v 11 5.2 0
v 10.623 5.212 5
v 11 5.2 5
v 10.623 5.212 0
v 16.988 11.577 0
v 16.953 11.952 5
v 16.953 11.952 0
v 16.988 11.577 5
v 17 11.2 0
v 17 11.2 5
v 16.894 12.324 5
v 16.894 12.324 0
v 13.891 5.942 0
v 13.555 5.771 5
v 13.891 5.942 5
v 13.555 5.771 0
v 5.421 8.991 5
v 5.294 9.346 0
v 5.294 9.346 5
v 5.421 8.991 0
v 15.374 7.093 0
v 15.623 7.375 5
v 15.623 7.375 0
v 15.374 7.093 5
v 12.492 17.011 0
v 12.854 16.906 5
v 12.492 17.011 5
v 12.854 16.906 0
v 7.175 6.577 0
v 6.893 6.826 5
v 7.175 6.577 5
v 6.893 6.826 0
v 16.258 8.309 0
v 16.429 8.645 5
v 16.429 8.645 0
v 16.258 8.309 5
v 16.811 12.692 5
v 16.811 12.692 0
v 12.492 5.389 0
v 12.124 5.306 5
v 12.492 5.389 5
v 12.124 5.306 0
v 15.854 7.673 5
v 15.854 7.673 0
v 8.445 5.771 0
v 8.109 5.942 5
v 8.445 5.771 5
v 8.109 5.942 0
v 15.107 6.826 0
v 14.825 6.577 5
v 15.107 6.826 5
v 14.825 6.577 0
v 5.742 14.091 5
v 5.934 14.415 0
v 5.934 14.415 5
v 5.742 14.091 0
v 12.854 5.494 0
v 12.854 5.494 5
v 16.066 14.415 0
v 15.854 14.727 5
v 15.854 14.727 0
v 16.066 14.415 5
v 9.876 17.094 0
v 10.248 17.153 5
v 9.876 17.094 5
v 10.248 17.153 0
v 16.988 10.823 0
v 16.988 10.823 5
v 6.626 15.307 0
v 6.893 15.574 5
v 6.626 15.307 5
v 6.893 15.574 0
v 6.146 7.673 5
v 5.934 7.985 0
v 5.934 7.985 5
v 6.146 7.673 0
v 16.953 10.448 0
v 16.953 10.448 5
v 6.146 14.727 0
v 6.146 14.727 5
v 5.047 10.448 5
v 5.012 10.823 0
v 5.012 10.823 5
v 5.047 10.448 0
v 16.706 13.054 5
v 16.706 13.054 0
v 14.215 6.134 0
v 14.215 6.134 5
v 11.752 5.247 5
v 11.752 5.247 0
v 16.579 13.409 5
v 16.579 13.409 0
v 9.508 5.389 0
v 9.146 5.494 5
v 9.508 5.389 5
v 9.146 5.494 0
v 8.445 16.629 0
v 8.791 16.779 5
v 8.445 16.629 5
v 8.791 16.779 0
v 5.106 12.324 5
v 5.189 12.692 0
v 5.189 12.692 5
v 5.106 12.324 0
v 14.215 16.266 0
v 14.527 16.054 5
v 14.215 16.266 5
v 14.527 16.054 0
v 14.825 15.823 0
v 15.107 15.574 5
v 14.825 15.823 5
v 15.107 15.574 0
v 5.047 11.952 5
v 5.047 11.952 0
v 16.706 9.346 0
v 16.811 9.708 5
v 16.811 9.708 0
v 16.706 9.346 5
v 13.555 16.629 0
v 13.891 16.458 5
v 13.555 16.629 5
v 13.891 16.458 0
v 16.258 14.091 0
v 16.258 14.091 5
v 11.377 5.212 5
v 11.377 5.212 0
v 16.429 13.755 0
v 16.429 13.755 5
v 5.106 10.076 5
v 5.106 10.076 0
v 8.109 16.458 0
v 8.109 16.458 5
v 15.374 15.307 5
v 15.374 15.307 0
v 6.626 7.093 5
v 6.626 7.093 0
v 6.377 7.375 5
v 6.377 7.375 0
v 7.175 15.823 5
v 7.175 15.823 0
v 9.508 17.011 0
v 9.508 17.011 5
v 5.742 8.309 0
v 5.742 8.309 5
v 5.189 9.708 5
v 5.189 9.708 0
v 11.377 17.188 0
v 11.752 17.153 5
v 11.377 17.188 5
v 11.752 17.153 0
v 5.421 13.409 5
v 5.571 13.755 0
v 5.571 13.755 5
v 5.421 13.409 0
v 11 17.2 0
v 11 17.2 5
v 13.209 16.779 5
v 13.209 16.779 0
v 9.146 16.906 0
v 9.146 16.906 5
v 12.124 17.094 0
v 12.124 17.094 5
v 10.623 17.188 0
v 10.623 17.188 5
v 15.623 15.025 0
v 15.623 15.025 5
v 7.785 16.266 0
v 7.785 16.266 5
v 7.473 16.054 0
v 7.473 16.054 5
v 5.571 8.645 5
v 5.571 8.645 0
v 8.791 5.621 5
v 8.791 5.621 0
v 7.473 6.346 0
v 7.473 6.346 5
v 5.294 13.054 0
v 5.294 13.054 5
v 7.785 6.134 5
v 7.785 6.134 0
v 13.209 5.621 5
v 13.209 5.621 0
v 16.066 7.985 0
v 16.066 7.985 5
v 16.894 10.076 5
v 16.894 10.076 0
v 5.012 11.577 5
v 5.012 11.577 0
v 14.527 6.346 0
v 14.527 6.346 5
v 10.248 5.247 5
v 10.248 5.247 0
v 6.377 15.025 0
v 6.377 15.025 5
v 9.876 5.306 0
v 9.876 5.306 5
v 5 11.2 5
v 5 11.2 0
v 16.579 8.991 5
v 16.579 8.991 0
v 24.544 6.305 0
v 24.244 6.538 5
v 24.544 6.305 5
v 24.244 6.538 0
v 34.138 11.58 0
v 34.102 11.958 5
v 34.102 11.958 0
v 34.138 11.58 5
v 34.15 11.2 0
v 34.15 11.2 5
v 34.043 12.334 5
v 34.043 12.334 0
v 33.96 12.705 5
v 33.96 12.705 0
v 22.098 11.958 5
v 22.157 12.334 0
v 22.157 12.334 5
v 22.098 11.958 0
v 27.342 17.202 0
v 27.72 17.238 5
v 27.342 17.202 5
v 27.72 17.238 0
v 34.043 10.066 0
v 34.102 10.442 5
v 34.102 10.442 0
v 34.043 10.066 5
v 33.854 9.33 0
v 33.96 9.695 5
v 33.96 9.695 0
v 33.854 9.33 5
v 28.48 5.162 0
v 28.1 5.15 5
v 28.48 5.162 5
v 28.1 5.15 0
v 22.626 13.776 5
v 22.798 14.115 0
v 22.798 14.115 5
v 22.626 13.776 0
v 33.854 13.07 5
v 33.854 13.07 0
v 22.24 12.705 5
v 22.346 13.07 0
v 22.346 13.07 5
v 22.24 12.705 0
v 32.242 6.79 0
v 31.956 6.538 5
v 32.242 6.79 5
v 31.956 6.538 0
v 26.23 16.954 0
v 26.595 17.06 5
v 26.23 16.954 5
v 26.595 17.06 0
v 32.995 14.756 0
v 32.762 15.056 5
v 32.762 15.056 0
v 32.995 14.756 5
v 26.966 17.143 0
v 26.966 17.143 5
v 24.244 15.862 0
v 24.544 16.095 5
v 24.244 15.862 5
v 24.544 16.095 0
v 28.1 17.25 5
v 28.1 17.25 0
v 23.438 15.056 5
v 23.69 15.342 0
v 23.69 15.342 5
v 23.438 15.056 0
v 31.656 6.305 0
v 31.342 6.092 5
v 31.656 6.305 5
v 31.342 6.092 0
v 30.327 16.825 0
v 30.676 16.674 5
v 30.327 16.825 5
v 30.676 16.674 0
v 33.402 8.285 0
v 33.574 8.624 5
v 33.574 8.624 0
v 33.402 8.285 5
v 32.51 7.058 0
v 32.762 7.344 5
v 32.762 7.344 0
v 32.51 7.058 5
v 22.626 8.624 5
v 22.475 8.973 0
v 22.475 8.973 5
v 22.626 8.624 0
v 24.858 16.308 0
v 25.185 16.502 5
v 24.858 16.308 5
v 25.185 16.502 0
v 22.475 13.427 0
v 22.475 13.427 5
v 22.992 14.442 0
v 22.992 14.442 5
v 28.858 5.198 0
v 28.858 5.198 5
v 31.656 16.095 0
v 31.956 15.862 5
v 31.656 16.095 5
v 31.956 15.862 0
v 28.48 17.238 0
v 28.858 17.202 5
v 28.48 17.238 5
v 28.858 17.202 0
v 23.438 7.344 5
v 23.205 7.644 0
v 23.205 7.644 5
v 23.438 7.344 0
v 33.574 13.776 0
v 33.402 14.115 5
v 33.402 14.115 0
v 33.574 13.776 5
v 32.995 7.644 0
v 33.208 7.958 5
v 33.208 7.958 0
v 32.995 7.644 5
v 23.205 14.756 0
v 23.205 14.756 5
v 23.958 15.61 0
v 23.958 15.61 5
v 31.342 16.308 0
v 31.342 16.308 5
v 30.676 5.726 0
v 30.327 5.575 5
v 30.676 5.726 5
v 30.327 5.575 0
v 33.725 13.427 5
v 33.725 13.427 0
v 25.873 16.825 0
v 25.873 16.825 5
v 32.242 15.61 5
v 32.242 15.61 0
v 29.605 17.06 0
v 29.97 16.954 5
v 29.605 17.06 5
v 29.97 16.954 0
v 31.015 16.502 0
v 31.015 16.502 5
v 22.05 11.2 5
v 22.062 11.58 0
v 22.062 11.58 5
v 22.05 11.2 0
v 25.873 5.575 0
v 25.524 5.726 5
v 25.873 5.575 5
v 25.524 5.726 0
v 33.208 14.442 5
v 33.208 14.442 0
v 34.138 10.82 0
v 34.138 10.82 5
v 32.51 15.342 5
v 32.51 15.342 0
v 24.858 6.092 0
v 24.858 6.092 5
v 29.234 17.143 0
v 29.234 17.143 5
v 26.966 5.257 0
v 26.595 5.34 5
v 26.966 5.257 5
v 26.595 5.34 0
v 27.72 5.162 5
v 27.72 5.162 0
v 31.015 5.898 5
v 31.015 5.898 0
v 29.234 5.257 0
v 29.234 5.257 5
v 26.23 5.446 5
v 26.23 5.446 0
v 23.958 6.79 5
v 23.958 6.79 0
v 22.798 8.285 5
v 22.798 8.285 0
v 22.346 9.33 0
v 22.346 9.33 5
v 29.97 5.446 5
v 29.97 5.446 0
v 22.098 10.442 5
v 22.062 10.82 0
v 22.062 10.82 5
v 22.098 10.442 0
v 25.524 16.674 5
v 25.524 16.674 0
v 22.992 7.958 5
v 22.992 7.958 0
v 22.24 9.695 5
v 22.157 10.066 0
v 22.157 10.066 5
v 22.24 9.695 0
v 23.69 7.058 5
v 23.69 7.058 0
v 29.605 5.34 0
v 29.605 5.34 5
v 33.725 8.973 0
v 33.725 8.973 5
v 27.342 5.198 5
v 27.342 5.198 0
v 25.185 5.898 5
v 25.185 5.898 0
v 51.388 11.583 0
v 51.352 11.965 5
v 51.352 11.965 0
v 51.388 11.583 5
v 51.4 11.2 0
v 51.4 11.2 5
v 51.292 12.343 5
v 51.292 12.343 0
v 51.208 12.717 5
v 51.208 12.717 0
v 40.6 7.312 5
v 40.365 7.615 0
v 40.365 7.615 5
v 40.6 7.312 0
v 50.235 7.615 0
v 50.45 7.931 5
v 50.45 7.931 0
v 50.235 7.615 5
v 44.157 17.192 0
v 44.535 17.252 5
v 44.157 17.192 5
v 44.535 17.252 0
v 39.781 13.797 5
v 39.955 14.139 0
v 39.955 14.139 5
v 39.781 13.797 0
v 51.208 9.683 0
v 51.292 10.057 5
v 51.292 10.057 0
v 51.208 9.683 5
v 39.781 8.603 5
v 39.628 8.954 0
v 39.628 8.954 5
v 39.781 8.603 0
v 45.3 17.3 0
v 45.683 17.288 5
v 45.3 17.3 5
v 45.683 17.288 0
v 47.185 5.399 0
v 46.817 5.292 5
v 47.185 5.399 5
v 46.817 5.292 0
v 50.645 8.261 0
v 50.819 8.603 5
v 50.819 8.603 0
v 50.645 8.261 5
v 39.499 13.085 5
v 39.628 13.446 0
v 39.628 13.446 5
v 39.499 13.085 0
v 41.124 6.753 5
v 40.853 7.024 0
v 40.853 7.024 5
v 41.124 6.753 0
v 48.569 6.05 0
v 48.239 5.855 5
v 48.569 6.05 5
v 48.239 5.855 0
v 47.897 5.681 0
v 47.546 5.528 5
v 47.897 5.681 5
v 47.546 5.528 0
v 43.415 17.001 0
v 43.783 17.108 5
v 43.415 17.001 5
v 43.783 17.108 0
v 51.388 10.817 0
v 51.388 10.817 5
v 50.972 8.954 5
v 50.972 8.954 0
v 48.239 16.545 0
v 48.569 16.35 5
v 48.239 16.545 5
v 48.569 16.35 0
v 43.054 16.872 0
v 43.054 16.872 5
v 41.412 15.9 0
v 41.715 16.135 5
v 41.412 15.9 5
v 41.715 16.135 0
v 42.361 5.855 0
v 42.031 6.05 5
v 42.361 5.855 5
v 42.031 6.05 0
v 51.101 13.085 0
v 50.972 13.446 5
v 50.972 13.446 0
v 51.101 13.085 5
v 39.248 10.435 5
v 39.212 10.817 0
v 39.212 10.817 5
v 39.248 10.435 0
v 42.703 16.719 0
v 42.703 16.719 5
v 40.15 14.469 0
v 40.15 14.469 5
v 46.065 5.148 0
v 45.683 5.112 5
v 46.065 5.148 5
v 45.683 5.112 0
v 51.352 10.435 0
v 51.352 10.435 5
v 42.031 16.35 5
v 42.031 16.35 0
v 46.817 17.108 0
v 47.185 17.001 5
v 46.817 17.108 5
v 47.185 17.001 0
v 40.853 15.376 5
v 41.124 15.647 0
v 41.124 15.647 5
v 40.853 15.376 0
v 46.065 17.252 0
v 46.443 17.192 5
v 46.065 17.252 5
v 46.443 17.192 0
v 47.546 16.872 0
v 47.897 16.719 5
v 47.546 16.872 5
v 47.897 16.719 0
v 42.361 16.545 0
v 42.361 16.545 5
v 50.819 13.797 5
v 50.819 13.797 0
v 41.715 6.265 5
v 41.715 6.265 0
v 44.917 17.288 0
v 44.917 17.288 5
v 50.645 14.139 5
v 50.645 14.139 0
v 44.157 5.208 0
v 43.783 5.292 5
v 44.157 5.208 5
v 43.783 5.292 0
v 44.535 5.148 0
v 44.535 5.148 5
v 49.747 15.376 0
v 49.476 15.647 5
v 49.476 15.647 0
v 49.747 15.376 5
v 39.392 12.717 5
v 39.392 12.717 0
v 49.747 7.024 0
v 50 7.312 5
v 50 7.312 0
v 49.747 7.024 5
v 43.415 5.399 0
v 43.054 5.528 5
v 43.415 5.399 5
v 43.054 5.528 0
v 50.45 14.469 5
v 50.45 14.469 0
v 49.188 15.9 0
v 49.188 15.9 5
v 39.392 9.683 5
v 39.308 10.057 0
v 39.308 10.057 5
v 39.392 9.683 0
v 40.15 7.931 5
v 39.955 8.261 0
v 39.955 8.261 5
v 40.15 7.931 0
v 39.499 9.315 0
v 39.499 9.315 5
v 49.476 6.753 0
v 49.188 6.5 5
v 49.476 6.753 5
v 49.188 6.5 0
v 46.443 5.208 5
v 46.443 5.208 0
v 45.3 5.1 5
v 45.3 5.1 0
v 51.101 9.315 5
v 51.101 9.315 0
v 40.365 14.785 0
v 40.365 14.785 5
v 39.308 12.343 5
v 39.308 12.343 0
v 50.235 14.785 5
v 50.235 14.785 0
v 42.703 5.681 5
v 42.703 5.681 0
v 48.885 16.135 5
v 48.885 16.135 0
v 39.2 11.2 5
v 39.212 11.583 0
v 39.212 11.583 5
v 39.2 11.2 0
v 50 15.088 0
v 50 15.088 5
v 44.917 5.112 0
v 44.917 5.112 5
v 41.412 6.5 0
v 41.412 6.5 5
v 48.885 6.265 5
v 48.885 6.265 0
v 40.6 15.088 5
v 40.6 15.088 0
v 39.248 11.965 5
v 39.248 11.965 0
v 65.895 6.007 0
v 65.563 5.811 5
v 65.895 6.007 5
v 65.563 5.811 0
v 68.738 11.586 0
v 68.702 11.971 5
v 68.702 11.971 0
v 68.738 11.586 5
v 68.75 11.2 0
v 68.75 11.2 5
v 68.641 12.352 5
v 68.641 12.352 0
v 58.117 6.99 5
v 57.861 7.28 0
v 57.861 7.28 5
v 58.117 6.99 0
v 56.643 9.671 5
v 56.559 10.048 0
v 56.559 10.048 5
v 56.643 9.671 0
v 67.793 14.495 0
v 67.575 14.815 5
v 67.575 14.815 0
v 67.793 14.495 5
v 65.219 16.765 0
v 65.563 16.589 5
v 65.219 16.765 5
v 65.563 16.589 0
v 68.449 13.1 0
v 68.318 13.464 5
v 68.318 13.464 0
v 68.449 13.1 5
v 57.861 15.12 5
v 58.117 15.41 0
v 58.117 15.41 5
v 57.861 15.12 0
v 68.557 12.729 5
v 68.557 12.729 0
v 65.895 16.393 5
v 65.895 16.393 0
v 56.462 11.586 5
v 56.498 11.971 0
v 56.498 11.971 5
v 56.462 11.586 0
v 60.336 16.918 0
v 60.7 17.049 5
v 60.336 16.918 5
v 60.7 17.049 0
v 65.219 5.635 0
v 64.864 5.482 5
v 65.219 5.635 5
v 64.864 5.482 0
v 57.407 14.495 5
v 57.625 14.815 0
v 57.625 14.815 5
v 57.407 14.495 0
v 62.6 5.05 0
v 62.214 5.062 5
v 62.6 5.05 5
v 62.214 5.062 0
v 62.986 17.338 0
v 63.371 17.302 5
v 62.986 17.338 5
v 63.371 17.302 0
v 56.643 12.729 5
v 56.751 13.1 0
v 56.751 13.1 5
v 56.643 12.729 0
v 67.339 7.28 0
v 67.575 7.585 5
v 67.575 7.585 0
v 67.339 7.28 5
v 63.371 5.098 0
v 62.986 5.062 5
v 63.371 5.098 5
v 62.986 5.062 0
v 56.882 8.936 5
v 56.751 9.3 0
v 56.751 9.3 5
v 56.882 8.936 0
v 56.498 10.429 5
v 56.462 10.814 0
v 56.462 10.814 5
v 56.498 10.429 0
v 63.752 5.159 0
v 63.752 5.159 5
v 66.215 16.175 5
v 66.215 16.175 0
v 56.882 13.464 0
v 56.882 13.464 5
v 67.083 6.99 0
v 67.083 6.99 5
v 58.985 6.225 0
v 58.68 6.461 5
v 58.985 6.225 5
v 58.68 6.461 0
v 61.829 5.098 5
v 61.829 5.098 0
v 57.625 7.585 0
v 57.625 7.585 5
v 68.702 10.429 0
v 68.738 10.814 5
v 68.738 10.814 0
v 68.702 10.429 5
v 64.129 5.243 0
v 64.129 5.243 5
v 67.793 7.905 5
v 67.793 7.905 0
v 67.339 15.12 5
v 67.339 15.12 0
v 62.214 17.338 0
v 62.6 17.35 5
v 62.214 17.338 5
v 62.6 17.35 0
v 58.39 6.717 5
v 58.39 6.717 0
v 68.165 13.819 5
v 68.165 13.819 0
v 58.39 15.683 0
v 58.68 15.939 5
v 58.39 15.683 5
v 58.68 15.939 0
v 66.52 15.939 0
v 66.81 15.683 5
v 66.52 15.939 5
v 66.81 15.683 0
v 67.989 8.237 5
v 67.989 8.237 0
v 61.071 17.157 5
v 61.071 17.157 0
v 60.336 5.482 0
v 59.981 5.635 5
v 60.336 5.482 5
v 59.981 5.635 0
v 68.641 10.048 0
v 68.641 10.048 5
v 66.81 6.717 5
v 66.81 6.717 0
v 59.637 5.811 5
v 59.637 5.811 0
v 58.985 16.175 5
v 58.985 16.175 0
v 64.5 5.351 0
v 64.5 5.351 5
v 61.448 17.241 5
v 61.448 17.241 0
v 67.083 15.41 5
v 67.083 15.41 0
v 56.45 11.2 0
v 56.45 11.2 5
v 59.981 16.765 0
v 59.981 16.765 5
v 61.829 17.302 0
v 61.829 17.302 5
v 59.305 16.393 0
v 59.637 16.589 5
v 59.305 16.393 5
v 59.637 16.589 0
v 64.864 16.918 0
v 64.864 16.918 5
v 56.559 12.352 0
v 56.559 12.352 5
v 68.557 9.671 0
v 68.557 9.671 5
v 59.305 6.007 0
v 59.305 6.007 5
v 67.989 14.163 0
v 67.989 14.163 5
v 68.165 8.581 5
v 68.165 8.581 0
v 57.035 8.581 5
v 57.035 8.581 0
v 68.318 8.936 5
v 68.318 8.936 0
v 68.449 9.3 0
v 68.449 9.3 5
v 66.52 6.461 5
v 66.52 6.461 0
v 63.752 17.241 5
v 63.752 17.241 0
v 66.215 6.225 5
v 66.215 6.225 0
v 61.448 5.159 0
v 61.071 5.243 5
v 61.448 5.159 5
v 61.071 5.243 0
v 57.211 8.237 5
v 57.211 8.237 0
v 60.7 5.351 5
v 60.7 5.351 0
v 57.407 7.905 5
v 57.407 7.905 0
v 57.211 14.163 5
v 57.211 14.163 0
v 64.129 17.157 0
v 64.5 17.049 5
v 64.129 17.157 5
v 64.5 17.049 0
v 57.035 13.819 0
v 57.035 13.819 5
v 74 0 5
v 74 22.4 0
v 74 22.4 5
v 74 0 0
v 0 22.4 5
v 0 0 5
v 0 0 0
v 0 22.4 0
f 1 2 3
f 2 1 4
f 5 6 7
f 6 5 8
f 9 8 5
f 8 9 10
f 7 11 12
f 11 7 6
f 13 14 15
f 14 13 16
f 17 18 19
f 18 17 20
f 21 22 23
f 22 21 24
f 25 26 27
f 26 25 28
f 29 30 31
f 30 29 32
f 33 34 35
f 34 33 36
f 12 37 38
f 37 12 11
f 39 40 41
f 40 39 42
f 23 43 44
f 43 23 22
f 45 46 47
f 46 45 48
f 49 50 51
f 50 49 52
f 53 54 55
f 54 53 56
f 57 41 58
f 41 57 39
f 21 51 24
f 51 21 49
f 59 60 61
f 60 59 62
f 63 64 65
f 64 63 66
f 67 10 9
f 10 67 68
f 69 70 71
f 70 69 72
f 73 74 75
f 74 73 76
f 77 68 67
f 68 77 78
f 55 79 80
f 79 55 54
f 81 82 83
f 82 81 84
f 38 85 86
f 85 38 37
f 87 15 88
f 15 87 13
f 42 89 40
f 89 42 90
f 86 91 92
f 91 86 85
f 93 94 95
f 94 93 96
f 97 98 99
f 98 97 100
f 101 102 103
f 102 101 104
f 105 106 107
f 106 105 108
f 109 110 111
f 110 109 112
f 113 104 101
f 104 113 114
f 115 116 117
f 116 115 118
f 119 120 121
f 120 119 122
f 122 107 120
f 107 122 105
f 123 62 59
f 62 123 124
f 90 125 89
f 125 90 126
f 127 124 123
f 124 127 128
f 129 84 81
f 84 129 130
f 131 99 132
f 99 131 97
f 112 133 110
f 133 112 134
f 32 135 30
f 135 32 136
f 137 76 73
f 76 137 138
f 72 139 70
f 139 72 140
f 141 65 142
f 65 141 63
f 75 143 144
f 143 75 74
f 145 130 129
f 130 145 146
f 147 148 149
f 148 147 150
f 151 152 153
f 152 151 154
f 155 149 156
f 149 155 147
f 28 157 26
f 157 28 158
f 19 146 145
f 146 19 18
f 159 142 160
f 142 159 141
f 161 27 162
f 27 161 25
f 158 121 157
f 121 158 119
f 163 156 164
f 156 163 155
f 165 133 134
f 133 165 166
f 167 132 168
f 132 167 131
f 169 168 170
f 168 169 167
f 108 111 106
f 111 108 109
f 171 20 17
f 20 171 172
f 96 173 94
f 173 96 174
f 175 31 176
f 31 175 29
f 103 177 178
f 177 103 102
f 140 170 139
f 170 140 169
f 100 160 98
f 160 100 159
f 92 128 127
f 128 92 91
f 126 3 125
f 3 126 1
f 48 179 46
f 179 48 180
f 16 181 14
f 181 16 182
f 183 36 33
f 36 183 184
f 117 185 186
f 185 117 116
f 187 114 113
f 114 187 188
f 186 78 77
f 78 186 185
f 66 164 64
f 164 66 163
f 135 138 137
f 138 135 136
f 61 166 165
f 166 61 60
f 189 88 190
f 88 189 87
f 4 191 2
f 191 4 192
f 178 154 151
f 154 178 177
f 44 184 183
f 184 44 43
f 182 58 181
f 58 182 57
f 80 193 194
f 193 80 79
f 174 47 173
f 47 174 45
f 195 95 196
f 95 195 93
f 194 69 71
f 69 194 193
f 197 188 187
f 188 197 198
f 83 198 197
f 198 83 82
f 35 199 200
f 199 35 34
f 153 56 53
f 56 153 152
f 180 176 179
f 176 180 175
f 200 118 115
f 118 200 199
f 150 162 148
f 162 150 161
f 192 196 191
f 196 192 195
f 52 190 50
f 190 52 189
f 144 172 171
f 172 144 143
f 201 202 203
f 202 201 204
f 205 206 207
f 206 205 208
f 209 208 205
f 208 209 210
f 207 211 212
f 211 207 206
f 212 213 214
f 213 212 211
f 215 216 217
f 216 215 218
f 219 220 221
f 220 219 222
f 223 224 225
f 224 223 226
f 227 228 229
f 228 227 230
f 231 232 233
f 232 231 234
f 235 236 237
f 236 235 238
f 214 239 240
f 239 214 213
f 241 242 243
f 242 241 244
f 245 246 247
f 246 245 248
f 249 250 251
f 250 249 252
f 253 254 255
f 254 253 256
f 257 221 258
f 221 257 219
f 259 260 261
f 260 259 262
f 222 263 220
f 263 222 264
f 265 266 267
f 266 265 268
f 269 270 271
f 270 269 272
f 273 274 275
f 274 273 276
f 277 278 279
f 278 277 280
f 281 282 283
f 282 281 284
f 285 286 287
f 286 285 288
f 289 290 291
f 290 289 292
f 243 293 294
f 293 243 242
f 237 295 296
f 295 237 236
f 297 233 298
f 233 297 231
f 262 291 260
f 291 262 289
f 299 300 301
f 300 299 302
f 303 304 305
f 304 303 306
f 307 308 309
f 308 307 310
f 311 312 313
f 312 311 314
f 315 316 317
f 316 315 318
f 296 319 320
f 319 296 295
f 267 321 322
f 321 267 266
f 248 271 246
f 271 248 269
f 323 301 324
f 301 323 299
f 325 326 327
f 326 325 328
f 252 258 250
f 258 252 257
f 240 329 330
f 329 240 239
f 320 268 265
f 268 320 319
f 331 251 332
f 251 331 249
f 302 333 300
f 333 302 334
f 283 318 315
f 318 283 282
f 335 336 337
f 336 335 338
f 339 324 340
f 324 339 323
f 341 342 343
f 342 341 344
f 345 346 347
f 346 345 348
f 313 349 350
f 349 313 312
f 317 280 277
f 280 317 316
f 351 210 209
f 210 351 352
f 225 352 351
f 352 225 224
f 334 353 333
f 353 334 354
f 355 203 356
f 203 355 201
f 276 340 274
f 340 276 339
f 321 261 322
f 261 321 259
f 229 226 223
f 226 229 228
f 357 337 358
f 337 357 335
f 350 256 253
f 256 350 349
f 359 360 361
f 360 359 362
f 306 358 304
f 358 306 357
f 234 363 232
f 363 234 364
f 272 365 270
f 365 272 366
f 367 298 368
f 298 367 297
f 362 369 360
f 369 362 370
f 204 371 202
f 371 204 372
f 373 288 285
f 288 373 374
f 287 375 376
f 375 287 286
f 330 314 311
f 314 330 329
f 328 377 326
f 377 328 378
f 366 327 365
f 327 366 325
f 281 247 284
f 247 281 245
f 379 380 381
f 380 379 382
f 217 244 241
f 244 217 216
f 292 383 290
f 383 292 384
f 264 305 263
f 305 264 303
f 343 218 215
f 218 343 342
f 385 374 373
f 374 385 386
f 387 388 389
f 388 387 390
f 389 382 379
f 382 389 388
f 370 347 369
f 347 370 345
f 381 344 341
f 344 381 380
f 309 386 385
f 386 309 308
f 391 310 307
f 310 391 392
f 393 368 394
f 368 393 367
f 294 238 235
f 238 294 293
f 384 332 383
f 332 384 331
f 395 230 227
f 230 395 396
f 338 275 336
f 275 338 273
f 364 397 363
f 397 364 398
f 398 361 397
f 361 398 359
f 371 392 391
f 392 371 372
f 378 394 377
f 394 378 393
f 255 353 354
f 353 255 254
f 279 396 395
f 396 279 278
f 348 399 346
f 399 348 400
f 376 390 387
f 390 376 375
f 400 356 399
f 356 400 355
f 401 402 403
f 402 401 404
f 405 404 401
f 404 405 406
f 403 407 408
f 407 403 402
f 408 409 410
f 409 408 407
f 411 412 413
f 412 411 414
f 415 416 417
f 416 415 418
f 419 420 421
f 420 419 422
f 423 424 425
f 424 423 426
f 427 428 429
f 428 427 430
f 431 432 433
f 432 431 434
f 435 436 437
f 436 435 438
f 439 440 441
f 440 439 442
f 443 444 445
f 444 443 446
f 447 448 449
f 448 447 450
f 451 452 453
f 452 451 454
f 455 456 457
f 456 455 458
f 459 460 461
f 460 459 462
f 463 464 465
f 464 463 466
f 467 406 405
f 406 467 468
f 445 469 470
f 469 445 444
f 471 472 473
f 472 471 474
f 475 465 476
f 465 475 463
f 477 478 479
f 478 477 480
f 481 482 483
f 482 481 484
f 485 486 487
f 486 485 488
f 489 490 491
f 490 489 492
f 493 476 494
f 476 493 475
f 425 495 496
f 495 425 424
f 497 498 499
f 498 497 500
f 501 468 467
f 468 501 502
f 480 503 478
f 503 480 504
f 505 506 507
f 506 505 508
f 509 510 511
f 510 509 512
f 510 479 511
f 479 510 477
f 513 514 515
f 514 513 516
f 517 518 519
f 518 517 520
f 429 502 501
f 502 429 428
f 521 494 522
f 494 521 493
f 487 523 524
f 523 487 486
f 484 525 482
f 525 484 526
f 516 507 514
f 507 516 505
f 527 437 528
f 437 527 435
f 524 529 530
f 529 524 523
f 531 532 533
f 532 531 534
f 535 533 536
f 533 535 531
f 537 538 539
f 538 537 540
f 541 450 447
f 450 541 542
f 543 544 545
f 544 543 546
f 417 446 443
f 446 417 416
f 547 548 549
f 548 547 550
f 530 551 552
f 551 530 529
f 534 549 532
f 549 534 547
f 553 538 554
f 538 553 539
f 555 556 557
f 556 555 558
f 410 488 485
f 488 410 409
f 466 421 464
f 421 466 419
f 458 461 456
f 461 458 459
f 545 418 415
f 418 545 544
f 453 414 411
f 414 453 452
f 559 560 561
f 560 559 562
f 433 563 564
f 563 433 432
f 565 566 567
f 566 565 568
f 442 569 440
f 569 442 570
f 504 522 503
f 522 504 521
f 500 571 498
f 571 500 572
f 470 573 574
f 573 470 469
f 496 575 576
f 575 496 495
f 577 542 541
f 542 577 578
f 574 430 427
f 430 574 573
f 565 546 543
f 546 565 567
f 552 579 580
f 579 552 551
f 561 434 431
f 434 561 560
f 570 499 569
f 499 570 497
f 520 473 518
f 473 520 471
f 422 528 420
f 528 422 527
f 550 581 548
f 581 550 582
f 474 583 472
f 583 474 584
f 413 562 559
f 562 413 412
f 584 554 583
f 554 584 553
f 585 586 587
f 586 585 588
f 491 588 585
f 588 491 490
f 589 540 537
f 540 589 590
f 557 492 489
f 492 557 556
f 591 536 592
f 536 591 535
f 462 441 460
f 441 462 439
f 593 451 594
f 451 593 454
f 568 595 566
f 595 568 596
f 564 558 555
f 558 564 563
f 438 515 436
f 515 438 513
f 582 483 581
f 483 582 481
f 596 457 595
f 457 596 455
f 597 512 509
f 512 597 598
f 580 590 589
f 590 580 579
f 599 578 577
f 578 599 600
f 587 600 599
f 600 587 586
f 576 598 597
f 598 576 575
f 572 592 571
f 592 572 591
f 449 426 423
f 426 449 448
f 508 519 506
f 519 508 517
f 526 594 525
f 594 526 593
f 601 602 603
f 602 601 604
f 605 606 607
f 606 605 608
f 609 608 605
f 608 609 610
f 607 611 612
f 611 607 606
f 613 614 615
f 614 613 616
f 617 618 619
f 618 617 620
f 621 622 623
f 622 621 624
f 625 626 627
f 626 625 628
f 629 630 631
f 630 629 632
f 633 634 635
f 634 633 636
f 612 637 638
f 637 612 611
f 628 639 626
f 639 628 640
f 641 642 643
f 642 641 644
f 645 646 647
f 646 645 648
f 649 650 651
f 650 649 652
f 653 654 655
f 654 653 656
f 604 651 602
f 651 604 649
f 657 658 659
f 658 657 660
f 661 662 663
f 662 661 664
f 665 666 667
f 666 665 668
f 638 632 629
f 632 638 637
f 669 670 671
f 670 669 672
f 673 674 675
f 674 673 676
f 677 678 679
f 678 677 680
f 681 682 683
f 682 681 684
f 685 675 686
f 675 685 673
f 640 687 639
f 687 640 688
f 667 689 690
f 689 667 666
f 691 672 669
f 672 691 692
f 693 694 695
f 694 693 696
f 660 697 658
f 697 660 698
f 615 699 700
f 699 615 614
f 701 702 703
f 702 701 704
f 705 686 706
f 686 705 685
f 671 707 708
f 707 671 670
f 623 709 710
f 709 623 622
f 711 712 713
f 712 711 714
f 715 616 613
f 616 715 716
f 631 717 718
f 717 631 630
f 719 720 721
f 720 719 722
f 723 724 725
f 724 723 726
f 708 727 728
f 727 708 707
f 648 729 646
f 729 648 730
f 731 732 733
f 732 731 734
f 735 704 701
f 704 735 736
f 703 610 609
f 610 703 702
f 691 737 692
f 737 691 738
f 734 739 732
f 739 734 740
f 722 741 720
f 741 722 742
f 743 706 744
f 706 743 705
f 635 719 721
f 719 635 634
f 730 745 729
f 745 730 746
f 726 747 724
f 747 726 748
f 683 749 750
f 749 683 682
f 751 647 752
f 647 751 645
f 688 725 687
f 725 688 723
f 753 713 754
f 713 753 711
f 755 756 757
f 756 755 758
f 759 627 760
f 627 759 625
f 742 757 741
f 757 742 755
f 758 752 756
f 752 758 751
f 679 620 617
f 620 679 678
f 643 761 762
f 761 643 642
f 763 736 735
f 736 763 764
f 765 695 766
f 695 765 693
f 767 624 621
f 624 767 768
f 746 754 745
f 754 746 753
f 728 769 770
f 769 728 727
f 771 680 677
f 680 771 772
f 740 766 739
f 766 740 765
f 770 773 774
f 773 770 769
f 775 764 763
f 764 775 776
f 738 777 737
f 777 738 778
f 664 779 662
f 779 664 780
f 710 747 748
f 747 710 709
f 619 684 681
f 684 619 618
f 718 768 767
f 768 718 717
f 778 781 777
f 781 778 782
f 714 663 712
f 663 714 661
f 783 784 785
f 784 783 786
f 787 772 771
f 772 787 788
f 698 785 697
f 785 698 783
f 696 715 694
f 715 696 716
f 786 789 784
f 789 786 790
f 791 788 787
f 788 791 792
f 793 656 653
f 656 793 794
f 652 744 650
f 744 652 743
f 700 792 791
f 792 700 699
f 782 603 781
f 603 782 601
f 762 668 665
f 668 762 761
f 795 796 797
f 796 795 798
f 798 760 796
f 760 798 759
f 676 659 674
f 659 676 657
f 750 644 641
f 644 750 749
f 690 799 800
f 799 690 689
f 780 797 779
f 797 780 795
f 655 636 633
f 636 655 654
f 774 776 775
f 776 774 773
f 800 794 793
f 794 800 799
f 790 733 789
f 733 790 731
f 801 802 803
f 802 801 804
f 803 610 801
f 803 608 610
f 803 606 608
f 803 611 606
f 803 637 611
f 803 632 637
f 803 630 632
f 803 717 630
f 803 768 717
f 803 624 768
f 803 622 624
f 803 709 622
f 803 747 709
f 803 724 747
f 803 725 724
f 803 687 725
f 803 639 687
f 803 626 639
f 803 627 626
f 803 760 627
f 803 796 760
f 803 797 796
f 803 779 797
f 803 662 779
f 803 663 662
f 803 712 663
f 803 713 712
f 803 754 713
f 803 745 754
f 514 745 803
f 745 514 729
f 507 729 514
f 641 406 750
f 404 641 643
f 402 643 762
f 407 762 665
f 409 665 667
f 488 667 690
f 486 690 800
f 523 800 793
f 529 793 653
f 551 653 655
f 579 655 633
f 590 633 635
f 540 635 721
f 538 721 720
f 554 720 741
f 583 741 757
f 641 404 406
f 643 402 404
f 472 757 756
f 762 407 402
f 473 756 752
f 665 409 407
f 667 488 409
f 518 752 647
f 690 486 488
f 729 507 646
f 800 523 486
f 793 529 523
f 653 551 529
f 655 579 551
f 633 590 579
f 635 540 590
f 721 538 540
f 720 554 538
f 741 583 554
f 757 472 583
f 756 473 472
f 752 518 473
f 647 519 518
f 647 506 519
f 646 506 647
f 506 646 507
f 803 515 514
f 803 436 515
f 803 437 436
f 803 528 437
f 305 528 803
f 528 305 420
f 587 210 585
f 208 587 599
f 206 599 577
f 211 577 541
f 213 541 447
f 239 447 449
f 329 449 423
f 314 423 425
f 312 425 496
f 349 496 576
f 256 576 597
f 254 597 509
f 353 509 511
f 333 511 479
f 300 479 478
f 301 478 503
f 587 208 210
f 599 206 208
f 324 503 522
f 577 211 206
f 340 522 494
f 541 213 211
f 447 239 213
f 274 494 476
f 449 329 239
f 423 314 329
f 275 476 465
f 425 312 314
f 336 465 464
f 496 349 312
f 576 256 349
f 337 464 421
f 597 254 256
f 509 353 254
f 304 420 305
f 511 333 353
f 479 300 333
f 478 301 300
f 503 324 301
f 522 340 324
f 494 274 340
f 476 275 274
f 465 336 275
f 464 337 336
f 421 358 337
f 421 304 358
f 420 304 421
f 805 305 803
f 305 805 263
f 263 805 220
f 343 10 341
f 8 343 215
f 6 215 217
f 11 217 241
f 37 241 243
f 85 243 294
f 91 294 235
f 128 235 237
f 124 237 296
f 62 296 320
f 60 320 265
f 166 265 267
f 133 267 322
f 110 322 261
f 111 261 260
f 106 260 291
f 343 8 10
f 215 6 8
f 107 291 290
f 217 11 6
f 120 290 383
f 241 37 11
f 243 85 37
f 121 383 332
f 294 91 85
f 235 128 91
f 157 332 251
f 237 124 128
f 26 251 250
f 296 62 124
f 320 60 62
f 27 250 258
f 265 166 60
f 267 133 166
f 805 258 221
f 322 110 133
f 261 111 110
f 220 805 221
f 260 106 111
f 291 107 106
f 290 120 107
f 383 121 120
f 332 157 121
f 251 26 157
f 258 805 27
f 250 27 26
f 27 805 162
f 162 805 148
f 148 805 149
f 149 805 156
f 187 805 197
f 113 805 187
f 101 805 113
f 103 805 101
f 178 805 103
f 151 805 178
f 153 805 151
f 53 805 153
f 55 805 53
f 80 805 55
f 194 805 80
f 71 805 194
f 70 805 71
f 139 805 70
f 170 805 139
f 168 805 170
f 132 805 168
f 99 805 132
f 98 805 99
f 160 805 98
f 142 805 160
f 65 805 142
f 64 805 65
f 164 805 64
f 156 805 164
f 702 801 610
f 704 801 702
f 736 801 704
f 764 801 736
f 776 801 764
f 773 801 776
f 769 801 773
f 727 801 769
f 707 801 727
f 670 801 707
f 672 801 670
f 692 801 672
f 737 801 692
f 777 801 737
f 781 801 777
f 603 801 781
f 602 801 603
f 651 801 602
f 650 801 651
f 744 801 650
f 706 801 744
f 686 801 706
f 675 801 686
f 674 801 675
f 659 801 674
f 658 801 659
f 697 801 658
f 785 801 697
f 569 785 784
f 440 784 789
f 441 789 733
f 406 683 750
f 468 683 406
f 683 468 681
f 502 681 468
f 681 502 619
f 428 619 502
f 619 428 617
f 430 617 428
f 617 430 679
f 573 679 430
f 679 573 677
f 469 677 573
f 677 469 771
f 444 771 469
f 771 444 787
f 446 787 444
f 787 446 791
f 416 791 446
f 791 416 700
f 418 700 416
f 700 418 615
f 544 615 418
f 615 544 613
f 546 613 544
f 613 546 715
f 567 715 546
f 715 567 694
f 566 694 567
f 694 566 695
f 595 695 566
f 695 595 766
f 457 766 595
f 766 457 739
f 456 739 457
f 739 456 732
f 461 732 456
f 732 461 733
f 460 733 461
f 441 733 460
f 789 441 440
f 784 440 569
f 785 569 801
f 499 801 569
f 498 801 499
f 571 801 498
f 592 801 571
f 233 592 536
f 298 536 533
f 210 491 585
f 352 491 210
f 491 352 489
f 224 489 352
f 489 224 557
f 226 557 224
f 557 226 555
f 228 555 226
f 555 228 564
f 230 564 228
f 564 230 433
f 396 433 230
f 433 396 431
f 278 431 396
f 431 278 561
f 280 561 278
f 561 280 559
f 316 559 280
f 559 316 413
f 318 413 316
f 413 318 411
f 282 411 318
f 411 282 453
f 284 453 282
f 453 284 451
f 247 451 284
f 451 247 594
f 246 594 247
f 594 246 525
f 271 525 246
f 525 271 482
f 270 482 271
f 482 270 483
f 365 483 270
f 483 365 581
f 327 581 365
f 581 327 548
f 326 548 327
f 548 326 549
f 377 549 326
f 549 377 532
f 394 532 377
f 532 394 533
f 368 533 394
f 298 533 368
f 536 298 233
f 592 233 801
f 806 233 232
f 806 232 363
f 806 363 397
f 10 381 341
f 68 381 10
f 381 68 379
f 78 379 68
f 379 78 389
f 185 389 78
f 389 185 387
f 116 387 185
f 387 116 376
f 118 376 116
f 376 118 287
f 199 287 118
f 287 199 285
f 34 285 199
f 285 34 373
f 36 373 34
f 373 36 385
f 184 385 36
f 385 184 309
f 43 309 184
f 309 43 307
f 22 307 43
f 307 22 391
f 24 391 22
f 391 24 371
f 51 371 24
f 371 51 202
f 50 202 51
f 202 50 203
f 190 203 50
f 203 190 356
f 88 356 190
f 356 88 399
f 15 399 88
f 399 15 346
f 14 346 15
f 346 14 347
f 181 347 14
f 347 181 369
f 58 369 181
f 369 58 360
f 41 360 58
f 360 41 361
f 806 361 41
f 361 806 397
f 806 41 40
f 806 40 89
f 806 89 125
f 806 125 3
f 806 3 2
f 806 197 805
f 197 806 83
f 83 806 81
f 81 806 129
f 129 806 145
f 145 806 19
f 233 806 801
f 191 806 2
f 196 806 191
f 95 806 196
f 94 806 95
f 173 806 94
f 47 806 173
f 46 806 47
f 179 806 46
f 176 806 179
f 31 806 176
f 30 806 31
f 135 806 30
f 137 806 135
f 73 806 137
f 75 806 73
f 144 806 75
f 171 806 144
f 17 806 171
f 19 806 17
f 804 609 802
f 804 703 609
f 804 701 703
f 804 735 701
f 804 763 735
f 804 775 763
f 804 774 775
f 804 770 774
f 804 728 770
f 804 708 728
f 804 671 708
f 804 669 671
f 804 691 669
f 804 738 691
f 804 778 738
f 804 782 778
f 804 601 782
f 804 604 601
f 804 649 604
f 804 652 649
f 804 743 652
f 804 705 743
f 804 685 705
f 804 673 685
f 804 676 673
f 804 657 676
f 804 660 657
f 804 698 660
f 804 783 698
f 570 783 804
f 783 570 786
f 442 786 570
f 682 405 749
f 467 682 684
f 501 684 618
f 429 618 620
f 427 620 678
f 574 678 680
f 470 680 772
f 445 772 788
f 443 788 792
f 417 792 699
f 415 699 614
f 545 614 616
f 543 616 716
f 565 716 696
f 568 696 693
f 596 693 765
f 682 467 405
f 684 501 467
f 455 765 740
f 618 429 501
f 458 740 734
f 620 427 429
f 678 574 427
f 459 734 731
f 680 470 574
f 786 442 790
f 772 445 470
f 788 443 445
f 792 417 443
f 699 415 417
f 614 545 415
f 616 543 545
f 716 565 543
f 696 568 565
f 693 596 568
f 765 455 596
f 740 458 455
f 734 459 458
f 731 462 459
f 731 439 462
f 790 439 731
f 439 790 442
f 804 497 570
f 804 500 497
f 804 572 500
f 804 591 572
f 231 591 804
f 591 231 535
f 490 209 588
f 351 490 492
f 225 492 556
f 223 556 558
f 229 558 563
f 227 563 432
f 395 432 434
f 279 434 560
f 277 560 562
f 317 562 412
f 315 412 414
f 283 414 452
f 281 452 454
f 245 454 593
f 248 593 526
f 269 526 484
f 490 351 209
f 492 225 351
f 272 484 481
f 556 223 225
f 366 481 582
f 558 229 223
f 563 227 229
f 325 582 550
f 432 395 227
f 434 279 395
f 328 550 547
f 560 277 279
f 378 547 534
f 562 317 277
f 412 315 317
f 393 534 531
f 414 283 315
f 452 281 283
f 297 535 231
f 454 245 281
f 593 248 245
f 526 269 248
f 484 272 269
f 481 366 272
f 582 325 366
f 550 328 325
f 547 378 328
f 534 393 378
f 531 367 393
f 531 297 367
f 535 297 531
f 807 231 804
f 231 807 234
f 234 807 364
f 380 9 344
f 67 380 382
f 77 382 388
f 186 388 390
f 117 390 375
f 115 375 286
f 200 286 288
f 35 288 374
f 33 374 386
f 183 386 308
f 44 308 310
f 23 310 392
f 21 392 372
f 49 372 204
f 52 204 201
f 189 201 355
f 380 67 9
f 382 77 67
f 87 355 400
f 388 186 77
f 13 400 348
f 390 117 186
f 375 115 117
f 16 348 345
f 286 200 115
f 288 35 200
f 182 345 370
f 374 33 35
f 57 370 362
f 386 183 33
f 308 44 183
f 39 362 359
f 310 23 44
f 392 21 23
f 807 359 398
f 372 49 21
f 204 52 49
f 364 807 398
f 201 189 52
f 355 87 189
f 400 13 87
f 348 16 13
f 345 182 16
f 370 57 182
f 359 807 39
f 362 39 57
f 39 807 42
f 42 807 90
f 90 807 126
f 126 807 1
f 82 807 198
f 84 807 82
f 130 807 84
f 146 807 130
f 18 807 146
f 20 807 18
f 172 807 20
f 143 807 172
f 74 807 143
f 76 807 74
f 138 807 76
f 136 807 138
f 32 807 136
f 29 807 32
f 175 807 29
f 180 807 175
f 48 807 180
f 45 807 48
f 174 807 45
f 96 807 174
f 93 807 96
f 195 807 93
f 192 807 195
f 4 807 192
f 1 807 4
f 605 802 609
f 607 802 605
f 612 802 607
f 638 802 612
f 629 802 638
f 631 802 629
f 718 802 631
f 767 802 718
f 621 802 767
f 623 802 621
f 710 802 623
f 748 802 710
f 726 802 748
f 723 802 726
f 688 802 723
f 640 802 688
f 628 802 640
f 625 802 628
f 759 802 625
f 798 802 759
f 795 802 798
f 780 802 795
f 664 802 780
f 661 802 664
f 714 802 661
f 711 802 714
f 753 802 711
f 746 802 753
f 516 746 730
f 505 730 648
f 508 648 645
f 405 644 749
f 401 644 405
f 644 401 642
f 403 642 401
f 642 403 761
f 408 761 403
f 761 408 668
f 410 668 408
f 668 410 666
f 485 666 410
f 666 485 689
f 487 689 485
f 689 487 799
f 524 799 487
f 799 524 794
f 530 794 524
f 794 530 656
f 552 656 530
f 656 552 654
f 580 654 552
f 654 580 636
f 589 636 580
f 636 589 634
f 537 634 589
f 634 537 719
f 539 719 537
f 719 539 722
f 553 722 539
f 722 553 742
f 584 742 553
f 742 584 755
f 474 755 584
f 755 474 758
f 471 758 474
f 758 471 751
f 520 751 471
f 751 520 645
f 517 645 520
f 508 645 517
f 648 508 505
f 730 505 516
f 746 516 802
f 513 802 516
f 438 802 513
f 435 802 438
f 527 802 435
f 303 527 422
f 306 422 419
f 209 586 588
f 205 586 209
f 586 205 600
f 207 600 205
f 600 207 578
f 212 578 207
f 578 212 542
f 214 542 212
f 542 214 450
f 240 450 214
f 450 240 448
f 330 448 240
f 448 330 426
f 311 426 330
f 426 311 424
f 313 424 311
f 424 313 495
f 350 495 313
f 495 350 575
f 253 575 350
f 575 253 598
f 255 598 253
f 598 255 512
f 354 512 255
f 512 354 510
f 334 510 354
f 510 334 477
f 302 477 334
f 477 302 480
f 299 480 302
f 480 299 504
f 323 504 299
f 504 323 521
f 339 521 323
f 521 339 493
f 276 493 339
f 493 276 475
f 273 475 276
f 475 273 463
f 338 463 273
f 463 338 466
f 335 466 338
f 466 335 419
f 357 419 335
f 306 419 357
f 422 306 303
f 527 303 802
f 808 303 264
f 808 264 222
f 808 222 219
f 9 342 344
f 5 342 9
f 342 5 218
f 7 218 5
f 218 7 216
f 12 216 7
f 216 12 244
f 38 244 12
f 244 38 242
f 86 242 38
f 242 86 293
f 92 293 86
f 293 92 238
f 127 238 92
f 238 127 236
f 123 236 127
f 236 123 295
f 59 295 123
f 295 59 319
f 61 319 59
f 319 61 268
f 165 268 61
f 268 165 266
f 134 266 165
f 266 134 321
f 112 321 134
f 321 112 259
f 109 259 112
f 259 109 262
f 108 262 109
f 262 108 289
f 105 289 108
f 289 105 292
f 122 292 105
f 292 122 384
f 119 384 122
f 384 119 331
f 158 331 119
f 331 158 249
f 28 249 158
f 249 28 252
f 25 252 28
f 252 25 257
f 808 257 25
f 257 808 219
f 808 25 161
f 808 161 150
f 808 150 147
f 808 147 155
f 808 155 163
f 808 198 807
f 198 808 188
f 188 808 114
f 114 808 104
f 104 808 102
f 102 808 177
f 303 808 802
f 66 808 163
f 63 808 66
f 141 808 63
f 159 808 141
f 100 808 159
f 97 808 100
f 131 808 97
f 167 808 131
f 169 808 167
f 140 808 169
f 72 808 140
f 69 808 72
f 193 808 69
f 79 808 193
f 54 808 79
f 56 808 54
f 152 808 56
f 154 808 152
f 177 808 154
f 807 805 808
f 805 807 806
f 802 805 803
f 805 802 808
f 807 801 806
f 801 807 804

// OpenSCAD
// Number of facets on each hole.
facets=100;

// The diameter of the smallest hole.
base_hole = 12.0;

// How much to increase the size of each hole.
step = 0.1;

// How many holes to make.
count = 4;

// How much space between each hole.
pad = 5;

// How thick should the block be.
block_thickness = 5;

// How wide the block should be.
// Big enough for the widest hole plus padding on each side.
block_width = base_hole + step*count + pad*2;

// How long the block should be.
// Size of the smallest hole * the number of holes +
// 1 pad for each hole (plus 1 more for the end) +
// the accumulated growth of each hole (sum of arithemetic sequence).
block_length = (base_hole + pad + (step + step*count)/2) * count + pad;

difference() {
  // The block
  cube([block_length,block_width,block_thickness], false);
  
  // The holes
  union() {
    for(i=[0:count-1]) {
      // Offset for each hole is the same as the length calculation
      // except for the current index instead of the total.
      translate([(base_hole + pad + (step + step*i)/2)*i + base_hole/2 + pad,block_width/2,-1]) {
        // Hole size is just the smallest hole size plus the step times
        // index.
        cylinder(d=base_hole+step*i, h=block_thickness+2, $fn=facets);
      }
    }
  }
}
